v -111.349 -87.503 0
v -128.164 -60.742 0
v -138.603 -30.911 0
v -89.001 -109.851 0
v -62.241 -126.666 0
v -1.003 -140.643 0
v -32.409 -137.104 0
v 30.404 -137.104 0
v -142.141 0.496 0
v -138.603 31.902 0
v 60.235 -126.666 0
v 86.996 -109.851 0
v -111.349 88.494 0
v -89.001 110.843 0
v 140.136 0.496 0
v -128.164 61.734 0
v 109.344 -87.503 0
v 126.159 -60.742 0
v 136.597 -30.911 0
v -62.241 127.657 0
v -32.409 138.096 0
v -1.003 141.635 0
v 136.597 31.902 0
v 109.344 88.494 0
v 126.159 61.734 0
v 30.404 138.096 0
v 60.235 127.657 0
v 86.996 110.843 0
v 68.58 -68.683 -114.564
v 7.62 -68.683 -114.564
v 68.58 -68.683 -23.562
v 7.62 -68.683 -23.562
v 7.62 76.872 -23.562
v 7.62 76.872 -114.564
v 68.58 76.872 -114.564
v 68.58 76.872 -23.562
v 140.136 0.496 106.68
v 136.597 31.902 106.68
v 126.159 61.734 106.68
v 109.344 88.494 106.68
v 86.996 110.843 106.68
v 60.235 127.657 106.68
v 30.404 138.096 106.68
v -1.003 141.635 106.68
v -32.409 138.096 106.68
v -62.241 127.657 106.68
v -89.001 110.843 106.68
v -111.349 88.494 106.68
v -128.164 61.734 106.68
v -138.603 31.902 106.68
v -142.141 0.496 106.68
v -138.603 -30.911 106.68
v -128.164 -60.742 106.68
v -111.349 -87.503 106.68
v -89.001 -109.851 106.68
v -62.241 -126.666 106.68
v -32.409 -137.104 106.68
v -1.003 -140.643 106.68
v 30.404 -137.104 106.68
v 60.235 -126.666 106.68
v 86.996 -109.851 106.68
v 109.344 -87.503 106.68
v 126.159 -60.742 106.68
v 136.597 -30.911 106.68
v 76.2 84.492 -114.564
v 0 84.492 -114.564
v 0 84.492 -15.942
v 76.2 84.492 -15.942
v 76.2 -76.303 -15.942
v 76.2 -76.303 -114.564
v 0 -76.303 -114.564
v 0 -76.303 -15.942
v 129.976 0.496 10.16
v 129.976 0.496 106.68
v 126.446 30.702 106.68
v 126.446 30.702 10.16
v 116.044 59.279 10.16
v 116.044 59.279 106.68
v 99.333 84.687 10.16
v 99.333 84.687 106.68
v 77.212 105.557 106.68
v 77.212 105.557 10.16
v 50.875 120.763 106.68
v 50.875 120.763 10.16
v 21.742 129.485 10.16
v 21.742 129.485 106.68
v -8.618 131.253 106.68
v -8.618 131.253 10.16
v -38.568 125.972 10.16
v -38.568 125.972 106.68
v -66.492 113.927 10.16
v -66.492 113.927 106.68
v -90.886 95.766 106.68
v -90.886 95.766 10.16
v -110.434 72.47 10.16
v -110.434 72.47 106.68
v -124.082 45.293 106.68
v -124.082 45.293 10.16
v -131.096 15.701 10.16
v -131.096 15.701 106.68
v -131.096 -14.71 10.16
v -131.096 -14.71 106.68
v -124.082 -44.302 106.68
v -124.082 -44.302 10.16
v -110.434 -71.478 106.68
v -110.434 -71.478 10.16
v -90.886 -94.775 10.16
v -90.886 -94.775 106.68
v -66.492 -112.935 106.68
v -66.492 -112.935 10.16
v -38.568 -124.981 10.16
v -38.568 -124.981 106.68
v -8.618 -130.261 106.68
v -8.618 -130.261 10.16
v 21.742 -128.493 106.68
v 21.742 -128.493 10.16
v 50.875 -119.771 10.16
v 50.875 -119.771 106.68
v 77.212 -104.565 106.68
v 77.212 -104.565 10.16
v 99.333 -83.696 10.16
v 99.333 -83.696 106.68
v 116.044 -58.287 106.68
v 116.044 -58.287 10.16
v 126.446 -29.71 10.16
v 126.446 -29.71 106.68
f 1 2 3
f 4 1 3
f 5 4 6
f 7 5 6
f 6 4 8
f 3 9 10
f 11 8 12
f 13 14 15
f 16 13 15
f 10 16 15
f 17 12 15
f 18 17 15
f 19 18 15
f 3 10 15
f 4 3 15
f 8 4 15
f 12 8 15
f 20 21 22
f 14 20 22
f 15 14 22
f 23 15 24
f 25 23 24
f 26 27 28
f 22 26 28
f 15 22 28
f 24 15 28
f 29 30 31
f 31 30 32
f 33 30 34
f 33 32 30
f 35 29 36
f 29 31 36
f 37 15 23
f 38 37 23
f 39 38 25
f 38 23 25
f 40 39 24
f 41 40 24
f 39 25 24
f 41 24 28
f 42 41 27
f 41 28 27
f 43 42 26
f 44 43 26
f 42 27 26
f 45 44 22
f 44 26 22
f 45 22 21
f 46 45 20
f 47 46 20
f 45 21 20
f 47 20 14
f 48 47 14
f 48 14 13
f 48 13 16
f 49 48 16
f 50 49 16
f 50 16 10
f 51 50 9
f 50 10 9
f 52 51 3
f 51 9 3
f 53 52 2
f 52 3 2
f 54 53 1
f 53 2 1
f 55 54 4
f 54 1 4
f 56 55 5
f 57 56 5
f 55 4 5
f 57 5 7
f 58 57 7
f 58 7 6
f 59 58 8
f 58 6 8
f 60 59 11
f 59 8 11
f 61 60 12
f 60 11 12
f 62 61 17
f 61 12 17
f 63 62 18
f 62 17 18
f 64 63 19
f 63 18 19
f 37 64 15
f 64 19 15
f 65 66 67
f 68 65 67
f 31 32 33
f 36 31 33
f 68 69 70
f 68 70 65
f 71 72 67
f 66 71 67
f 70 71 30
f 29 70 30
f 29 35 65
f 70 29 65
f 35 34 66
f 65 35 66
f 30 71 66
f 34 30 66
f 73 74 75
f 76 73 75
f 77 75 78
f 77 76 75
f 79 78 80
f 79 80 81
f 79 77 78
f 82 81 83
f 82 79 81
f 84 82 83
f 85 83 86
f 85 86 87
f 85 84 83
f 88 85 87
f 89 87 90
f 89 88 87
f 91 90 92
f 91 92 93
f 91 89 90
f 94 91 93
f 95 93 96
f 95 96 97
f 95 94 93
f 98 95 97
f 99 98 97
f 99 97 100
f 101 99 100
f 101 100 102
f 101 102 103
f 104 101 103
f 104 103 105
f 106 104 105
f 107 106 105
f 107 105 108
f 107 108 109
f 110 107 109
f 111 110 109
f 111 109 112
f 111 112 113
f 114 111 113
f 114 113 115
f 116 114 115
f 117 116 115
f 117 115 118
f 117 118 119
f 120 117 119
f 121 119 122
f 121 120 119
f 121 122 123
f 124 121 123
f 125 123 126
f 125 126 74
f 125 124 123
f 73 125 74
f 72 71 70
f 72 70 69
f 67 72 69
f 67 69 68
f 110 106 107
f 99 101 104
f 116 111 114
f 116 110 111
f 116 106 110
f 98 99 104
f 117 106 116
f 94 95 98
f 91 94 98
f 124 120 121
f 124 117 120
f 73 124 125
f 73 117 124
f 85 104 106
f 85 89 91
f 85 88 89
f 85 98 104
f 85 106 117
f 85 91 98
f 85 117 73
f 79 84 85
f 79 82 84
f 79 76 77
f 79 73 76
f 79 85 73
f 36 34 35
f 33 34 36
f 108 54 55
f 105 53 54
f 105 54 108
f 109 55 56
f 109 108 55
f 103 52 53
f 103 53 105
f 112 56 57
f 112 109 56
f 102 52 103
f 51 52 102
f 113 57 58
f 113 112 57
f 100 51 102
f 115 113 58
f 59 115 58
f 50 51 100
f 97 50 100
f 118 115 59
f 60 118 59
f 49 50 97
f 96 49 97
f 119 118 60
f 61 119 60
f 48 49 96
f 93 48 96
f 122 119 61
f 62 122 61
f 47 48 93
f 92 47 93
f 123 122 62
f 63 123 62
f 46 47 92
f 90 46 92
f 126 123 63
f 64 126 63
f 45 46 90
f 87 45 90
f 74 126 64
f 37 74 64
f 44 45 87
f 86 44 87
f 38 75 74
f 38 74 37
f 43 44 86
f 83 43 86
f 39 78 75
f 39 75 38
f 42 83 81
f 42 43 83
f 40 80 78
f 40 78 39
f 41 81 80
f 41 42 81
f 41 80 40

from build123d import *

# Parameters (mm, degrees)
F0_R     = 141.138793
F1_DEPTH = 106.68
F2_T     = -10.16
F3_W     = 160.795249
F3_H     = 98.622448
F4_DEPTH = 76.2
F5_T     = -7.62


with BuildPart() as f1:
    # F0 (on Top) → F1 (new body)
    with BuildSketch(Plane.XY):
        with Locations((-1.002694, 0.495775)):
            Circle(F0_R)
    extrude(amount=F1_DEPTH)

    # F2
    f2_openings = [f1.faces().sort_by_distance(p)[0] for p in [
        (-1.002694, 0.495775, 106.68),
    ]]
    offset(amount=F2_T, openings=f2_openings)


with BuildPart() as f4:
    # F3 (on Right) → F4 (new body)
    with BuildSketch(Plane.YZ):
        with Locations((4.09444, -65.253105)):
            Rectangle(F3_W, F3_H)
    extrude(amount=F4_DEPTH)

    # F5
    f5_openings = [f4.faces().sort_by_distance(p)[0] for p in [
        (38.1, 4.09444, -114.564329),
    ]]
    offset(amount=F5_T, openings=f5_openings)


solid = Compound([f1.part, f4.part])
